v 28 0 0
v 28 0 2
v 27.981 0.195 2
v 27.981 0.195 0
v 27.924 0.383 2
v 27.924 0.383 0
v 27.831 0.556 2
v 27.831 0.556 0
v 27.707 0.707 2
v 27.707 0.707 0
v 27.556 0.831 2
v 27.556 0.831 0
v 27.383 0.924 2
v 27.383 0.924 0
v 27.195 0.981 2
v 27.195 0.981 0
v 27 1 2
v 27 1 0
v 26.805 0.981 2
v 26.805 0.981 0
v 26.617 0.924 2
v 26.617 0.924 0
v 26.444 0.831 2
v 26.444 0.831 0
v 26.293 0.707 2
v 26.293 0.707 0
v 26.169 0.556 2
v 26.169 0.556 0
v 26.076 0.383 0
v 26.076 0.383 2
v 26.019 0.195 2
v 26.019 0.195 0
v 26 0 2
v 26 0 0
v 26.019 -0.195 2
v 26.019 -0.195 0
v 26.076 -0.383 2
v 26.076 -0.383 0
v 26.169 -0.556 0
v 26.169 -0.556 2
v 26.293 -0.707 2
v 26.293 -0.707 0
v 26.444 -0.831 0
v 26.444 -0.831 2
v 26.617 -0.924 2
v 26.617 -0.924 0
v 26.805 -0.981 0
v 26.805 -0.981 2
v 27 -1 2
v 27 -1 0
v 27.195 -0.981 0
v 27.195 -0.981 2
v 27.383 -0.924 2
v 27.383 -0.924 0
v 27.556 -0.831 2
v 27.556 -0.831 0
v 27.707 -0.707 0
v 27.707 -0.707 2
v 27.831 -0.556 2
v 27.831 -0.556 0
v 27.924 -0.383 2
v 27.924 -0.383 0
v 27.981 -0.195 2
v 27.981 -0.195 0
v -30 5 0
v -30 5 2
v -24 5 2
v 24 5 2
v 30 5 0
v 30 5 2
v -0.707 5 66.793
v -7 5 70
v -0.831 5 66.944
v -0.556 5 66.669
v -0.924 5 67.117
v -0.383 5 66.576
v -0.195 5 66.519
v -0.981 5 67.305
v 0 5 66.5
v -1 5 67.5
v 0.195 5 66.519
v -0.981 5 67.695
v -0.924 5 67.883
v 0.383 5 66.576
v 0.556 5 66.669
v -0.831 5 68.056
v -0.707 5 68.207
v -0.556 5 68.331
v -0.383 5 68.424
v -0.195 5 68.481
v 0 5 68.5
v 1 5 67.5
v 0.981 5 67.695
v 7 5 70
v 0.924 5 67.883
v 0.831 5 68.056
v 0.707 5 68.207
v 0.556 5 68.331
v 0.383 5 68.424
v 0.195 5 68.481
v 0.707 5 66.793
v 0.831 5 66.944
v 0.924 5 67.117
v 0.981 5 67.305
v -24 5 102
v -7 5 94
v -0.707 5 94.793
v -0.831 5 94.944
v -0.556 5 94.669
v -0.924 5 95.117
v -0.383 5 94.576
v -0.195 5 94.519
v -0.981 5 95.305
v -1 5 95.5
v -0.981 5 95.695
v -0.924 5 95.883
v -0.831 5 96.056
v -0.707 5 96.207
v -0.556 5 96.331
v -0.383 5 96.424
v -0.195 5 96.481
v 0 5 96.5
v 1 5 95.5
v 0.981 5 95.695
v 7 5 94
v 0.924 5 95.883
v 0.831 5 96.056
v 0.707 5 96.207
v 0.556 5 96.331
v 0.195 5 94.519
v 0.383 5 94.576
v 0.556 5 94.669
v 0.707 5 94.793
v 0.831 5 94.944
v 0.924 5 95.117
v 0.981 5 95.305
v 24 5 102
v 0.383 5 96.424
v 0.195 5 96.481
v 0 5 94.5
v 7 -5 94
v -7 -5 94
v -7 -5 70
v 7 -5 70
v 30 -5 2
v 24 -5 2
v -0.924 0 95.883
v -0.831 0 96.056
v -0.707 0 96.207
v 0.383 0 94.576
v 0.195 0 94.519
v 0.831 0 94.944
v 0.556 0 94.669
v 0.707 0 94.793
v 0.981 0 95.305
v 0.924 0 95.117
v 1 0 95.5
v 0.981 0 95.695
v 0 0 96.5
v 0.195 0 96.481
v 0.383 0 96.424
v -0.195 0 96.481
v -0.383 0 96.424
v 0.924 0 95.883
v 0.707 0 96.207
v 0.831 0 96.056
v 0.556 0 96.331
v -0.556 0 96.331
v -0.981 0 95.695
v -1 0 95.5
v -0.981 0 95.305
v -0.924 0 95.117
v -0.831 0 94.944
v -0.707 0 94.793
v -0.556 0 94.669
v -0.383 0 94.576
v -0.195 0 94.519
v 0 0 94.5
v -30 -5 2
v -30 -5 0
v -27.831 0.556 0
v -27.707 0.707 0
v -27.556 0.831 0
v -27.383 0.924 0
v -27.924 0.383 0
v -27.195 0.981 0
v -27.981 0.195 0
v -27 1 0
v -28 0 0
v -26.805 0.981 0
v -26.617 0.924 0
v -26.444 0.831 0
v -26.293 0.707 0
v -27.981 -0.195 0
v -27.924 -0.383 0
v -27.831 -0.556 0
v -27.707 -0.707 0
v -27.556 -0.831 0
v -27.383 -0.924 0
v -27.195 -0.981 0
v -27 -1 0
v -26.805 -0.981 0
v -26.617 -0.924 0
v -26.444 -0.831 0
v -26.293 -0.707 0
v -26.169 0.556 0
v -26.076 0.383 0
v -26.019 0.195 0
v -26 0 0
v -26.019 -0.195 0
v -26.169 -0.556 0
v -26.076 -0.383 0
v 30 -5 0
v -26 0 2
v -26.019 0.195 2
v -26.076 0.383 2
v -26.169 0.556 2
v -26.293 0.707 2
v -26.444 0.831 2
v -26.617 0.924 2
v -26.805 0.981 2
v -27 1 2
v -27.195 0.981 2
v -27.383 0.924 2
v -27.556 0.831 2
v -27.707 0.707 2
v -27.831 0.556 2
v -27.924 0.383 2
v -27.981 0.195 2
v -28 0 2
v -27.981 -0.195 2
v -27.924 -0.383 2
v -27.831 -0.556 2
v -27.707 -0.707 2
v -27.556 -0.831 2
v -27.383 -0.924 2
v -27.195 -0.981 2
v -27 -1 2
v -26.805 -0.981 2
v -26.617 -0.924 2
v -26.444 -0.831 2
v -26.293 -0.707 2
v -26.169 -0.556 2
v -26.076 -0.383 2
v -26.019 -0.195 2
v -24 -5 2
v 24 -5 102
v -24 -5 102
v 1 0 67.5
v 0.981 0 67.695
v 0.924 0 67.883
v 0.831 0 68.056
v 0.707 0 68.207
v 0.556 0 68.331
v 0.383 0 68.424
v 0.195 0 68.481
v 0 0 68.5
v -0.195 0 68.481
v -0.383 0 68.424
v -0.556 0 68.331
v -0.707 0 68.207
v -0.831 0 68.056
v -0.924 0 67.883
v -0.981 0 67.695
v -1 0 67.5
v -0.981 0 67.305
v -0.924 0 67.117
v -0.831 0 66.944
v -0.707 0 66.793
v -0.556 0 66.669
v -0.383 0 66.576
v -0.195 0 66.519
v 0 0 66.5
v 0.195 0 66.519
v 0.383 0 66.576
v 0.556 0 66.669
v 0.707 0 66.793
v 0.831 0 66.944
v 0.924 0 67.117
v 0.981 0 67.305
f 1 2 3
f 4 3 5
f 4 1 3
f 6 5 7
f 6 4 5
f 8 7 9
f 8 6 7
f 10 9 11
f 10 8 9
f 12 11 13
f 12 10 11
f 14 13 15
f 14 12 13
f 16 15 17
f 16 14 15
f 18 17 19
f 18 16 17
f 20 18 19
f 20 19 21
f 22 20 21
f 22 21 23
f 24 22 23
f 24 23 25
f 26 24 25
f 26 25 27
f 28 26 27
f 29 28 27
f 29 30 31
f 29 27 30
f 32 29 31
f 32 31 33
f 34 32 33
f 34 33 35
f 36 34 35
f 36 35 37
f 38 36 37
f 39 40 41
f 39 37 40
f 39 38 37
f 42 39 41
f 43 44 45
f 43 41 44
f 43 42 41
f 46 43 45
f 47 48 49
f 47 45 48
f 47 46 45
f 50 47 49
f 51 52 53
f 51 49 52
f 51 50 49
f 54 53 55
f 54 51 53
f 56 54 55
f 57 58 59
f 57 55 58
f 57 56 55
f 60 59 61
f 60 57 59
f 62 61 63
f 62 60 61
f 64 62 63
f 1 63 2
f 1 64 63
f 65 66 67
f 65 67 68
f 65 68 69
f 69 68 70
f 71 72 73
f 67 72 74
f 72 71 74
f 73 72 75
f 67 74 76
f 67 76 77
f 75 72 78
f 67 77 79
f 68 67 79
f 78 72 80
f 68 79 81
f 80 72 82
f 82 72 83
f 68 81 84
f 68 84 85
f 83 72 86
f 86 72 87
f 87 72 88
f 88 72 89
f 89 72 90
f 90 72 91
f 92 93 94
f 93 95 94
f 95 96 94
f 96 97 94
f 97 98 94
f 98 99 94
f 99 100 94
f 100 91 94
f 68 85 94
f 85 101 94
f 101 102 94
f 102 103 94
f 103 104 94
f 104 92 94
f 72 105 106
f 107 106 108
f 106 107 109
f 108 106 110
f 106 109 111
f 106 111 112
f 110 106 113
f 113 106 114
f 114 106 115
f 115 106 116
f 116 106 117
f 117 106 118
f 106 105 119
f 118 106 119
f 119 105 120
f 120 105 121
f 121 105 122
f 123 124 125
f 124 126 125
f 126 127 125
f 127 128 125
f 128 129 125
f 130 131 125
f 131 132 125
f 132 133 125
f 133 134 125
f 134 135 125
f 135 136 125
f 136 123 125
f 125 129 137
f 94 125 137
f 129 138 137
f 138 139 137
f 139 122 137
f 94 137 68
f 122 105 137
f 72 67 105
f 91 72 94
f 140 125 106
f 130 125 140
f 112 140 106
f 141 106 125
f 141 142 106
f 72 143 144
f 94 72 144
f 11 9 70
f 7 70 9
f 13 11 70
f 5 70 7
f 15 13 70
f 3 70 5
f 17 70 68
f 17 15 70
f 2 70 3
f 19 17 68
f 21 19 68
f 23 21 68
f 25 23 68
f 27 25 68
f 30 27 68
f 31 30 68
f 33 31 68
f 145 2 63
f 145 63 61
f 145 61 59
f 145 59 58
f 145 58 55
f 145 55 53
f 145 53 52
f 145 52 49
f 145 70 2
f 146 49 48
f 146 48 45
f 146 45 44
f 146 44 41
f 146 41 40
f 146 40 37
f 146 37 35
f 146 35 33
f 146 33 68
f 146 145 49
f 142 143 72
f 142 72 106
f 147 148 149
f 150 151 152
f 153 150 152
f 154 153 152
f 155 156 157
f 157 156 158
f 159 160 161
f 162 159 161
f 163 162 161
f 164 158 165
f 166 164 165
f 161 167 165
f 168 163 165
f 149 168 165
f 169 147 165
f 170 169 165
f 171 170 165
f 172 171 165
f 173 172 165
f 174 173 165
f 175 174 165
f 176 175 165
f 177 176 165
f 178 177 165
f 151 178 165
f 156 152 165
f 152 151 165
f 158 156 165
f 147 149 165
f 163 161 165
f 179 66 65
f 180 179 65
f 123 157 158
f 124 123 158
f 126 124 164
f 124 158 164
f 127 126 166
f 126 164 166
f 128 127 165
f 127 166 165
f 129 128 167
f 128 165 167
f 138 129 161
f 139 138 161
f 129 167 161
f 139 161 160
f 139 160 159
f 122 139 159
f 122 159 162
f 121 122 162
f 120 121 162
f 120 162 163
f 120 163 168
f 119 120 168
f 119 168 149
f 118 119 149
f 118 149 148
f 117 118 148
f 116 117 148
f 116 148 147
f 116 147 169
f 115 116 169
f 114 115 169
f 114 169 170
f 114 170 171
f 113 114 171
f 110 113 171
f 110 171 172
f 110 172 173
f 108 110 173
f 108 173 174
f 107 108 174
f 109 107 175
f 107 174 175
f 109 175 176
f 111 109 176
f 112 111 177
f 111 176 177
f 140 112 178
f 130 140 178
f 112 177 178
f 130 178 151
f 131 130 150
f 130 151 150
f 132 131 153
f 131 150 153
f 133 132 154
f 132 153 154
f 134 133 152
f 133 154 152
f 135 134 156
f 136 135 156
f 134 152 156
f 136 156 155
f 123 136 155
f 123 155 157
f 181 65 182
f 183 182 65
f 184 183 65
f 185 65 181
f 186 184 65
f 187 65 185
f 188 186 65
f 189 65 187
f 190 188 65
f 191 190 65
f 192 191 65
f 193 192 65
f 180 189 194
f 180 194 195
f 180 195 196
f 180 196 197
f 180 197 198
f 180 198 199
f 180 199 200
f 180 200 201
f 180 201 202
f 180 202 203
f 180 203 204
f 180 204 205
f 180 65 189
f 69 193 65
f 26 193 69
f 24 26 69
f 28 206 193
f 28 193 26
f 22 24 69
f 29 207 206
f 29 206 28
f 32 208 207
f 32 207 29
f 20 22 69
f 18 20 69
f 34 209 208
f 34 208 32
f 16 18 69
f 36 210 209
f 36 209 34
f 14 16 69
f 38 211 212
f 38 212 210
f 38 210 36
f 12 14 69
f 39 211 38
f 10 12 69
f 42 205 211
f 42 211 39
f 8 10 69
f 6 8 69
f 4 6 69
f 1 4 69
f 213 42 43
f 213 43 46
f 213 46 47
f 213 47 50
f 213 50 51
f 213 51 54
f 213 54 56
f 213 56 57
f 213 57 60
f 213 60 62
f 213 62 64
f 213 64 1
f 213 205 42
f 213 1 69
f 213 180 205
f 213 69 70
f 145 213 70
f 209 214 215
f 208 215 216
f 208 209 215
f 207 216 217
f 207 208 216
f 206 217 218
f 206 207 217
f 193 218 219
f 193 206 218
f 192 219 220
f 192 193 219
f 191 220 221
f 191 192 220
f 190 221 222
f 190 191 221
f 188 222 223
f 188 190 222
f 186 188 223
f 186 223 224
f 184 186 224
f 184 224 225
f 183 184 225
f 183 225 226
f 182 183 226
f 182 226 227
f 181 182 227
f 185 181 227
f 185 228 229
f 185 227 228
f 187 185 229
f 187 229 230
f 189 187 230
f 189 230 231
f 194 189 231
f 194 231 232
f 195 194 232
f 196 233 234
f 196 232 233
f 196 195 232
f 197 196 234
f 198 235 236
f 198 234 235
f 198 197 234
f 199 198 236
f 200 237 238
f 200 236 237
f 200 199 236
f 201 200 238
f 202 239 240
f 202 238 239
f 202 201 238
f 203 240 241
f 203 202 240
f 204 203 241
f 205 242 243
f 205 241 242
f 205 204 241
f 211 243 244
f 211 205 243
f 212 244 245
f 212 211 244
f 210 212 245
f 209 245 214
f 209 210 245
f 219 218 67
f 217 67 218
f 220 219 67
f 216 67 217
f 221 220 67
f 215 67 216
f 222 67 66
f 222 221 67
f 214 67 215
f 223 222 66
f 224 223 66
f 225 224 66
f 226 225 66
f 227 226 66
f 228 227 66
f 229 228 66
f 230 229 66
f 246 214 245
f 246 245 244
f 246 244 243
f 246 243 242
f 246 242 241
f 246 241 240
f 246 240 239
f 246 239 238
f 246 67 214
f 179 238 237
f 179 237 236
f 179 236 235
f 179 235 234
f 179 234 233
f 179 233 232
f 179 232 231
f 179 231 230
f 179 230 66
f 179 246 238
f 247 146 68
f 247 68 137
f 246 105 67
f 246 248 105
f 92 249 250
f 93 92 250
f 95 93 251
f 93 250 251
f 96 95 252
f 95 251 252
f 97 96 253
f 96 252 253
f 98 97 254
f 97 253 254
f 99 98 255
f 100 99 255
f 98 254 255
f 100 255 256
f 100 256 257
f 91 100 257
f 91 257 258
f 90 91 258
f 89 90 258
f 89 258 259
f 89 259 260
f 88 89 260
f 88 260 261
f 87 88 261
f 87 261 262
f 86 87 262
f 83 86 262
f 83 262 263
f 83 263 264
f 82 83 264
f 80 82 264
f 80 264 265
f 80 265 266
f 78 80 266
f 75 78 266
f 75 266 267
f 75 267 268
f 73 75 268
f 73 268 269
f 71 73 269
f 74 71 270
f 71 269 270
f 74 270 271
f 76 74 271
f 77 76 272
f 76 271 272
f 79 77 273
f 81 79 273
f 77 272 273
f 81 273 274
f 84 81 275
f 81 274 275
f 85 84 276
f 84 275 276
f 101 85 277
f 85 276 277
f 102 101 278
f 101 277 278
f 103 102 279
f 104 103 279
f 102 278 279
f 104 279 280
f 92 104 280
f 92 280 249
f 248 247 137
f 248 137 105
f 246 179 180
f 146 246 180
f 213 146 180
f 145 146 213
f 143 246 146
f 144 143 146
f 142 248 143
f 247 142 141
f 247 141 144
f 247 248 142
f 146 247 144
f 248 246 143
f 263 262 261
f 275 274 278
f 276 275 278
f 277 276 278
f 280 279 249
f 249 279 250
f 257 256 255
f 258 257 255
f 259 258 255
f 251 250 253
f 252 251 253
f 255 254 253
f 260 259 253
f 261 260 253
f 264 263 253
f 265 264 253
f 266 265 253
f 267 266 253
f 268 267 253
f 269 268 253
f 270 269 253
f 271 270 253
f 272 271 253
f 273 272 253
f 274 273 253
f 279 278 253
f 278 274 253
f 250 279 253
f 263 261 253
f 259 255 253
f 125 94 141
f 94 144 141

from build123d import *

# Parameters (mm, degrees)
SKETCH_W        = 14
SKETCH_H        = 24
PAD_DEPTH       = 5
SKETCH003_R     = 1
POCKET_DEPTH    = 5
SKETCH004_R     = 1
POCKET001_DEPTH = 6


with BuildPart() as part:
    # Sketch → Pad (new body, symmetric)
    with BuildSketch(Plane.XZ):
        Polygon((-30, 0), (30, 0), (30, 2), (24, 2), (24, 102), (-24, 102), (-24, 2), (-30, 2), align=None)
        with Locations((0, 82)):
            Rectangle(SKETCH_W, SKETCH_H, mode=Mode.SUBTRACT)
    extrude(amount=PAD_DEPTH, both=True)

    # Sketch003 → Pocket (cut)
    with BuildSketch(Plane.XY):
        with Locations((-27, 0)):
            Circle(SKETCH003_R)
        with Locations((27, 0)):
            Circle(SKETCH003_R)
    extrude(amount=POCKET_DEPTH, mode=Mode.SUBTRACT)

    # Sketch004 → Pocket001 (cut)
    with BuildSketch(Plane.XZ):
        with Locations((0, 67.5)):
            Circle(SKETCH004_R)
        with Locations((0, 95.5)):
            Circle(SKETCH004_R)
    extrude(amount=-POCKET001_DEPTH, mode=Mode.SUBTRACT)


solid = part.part
